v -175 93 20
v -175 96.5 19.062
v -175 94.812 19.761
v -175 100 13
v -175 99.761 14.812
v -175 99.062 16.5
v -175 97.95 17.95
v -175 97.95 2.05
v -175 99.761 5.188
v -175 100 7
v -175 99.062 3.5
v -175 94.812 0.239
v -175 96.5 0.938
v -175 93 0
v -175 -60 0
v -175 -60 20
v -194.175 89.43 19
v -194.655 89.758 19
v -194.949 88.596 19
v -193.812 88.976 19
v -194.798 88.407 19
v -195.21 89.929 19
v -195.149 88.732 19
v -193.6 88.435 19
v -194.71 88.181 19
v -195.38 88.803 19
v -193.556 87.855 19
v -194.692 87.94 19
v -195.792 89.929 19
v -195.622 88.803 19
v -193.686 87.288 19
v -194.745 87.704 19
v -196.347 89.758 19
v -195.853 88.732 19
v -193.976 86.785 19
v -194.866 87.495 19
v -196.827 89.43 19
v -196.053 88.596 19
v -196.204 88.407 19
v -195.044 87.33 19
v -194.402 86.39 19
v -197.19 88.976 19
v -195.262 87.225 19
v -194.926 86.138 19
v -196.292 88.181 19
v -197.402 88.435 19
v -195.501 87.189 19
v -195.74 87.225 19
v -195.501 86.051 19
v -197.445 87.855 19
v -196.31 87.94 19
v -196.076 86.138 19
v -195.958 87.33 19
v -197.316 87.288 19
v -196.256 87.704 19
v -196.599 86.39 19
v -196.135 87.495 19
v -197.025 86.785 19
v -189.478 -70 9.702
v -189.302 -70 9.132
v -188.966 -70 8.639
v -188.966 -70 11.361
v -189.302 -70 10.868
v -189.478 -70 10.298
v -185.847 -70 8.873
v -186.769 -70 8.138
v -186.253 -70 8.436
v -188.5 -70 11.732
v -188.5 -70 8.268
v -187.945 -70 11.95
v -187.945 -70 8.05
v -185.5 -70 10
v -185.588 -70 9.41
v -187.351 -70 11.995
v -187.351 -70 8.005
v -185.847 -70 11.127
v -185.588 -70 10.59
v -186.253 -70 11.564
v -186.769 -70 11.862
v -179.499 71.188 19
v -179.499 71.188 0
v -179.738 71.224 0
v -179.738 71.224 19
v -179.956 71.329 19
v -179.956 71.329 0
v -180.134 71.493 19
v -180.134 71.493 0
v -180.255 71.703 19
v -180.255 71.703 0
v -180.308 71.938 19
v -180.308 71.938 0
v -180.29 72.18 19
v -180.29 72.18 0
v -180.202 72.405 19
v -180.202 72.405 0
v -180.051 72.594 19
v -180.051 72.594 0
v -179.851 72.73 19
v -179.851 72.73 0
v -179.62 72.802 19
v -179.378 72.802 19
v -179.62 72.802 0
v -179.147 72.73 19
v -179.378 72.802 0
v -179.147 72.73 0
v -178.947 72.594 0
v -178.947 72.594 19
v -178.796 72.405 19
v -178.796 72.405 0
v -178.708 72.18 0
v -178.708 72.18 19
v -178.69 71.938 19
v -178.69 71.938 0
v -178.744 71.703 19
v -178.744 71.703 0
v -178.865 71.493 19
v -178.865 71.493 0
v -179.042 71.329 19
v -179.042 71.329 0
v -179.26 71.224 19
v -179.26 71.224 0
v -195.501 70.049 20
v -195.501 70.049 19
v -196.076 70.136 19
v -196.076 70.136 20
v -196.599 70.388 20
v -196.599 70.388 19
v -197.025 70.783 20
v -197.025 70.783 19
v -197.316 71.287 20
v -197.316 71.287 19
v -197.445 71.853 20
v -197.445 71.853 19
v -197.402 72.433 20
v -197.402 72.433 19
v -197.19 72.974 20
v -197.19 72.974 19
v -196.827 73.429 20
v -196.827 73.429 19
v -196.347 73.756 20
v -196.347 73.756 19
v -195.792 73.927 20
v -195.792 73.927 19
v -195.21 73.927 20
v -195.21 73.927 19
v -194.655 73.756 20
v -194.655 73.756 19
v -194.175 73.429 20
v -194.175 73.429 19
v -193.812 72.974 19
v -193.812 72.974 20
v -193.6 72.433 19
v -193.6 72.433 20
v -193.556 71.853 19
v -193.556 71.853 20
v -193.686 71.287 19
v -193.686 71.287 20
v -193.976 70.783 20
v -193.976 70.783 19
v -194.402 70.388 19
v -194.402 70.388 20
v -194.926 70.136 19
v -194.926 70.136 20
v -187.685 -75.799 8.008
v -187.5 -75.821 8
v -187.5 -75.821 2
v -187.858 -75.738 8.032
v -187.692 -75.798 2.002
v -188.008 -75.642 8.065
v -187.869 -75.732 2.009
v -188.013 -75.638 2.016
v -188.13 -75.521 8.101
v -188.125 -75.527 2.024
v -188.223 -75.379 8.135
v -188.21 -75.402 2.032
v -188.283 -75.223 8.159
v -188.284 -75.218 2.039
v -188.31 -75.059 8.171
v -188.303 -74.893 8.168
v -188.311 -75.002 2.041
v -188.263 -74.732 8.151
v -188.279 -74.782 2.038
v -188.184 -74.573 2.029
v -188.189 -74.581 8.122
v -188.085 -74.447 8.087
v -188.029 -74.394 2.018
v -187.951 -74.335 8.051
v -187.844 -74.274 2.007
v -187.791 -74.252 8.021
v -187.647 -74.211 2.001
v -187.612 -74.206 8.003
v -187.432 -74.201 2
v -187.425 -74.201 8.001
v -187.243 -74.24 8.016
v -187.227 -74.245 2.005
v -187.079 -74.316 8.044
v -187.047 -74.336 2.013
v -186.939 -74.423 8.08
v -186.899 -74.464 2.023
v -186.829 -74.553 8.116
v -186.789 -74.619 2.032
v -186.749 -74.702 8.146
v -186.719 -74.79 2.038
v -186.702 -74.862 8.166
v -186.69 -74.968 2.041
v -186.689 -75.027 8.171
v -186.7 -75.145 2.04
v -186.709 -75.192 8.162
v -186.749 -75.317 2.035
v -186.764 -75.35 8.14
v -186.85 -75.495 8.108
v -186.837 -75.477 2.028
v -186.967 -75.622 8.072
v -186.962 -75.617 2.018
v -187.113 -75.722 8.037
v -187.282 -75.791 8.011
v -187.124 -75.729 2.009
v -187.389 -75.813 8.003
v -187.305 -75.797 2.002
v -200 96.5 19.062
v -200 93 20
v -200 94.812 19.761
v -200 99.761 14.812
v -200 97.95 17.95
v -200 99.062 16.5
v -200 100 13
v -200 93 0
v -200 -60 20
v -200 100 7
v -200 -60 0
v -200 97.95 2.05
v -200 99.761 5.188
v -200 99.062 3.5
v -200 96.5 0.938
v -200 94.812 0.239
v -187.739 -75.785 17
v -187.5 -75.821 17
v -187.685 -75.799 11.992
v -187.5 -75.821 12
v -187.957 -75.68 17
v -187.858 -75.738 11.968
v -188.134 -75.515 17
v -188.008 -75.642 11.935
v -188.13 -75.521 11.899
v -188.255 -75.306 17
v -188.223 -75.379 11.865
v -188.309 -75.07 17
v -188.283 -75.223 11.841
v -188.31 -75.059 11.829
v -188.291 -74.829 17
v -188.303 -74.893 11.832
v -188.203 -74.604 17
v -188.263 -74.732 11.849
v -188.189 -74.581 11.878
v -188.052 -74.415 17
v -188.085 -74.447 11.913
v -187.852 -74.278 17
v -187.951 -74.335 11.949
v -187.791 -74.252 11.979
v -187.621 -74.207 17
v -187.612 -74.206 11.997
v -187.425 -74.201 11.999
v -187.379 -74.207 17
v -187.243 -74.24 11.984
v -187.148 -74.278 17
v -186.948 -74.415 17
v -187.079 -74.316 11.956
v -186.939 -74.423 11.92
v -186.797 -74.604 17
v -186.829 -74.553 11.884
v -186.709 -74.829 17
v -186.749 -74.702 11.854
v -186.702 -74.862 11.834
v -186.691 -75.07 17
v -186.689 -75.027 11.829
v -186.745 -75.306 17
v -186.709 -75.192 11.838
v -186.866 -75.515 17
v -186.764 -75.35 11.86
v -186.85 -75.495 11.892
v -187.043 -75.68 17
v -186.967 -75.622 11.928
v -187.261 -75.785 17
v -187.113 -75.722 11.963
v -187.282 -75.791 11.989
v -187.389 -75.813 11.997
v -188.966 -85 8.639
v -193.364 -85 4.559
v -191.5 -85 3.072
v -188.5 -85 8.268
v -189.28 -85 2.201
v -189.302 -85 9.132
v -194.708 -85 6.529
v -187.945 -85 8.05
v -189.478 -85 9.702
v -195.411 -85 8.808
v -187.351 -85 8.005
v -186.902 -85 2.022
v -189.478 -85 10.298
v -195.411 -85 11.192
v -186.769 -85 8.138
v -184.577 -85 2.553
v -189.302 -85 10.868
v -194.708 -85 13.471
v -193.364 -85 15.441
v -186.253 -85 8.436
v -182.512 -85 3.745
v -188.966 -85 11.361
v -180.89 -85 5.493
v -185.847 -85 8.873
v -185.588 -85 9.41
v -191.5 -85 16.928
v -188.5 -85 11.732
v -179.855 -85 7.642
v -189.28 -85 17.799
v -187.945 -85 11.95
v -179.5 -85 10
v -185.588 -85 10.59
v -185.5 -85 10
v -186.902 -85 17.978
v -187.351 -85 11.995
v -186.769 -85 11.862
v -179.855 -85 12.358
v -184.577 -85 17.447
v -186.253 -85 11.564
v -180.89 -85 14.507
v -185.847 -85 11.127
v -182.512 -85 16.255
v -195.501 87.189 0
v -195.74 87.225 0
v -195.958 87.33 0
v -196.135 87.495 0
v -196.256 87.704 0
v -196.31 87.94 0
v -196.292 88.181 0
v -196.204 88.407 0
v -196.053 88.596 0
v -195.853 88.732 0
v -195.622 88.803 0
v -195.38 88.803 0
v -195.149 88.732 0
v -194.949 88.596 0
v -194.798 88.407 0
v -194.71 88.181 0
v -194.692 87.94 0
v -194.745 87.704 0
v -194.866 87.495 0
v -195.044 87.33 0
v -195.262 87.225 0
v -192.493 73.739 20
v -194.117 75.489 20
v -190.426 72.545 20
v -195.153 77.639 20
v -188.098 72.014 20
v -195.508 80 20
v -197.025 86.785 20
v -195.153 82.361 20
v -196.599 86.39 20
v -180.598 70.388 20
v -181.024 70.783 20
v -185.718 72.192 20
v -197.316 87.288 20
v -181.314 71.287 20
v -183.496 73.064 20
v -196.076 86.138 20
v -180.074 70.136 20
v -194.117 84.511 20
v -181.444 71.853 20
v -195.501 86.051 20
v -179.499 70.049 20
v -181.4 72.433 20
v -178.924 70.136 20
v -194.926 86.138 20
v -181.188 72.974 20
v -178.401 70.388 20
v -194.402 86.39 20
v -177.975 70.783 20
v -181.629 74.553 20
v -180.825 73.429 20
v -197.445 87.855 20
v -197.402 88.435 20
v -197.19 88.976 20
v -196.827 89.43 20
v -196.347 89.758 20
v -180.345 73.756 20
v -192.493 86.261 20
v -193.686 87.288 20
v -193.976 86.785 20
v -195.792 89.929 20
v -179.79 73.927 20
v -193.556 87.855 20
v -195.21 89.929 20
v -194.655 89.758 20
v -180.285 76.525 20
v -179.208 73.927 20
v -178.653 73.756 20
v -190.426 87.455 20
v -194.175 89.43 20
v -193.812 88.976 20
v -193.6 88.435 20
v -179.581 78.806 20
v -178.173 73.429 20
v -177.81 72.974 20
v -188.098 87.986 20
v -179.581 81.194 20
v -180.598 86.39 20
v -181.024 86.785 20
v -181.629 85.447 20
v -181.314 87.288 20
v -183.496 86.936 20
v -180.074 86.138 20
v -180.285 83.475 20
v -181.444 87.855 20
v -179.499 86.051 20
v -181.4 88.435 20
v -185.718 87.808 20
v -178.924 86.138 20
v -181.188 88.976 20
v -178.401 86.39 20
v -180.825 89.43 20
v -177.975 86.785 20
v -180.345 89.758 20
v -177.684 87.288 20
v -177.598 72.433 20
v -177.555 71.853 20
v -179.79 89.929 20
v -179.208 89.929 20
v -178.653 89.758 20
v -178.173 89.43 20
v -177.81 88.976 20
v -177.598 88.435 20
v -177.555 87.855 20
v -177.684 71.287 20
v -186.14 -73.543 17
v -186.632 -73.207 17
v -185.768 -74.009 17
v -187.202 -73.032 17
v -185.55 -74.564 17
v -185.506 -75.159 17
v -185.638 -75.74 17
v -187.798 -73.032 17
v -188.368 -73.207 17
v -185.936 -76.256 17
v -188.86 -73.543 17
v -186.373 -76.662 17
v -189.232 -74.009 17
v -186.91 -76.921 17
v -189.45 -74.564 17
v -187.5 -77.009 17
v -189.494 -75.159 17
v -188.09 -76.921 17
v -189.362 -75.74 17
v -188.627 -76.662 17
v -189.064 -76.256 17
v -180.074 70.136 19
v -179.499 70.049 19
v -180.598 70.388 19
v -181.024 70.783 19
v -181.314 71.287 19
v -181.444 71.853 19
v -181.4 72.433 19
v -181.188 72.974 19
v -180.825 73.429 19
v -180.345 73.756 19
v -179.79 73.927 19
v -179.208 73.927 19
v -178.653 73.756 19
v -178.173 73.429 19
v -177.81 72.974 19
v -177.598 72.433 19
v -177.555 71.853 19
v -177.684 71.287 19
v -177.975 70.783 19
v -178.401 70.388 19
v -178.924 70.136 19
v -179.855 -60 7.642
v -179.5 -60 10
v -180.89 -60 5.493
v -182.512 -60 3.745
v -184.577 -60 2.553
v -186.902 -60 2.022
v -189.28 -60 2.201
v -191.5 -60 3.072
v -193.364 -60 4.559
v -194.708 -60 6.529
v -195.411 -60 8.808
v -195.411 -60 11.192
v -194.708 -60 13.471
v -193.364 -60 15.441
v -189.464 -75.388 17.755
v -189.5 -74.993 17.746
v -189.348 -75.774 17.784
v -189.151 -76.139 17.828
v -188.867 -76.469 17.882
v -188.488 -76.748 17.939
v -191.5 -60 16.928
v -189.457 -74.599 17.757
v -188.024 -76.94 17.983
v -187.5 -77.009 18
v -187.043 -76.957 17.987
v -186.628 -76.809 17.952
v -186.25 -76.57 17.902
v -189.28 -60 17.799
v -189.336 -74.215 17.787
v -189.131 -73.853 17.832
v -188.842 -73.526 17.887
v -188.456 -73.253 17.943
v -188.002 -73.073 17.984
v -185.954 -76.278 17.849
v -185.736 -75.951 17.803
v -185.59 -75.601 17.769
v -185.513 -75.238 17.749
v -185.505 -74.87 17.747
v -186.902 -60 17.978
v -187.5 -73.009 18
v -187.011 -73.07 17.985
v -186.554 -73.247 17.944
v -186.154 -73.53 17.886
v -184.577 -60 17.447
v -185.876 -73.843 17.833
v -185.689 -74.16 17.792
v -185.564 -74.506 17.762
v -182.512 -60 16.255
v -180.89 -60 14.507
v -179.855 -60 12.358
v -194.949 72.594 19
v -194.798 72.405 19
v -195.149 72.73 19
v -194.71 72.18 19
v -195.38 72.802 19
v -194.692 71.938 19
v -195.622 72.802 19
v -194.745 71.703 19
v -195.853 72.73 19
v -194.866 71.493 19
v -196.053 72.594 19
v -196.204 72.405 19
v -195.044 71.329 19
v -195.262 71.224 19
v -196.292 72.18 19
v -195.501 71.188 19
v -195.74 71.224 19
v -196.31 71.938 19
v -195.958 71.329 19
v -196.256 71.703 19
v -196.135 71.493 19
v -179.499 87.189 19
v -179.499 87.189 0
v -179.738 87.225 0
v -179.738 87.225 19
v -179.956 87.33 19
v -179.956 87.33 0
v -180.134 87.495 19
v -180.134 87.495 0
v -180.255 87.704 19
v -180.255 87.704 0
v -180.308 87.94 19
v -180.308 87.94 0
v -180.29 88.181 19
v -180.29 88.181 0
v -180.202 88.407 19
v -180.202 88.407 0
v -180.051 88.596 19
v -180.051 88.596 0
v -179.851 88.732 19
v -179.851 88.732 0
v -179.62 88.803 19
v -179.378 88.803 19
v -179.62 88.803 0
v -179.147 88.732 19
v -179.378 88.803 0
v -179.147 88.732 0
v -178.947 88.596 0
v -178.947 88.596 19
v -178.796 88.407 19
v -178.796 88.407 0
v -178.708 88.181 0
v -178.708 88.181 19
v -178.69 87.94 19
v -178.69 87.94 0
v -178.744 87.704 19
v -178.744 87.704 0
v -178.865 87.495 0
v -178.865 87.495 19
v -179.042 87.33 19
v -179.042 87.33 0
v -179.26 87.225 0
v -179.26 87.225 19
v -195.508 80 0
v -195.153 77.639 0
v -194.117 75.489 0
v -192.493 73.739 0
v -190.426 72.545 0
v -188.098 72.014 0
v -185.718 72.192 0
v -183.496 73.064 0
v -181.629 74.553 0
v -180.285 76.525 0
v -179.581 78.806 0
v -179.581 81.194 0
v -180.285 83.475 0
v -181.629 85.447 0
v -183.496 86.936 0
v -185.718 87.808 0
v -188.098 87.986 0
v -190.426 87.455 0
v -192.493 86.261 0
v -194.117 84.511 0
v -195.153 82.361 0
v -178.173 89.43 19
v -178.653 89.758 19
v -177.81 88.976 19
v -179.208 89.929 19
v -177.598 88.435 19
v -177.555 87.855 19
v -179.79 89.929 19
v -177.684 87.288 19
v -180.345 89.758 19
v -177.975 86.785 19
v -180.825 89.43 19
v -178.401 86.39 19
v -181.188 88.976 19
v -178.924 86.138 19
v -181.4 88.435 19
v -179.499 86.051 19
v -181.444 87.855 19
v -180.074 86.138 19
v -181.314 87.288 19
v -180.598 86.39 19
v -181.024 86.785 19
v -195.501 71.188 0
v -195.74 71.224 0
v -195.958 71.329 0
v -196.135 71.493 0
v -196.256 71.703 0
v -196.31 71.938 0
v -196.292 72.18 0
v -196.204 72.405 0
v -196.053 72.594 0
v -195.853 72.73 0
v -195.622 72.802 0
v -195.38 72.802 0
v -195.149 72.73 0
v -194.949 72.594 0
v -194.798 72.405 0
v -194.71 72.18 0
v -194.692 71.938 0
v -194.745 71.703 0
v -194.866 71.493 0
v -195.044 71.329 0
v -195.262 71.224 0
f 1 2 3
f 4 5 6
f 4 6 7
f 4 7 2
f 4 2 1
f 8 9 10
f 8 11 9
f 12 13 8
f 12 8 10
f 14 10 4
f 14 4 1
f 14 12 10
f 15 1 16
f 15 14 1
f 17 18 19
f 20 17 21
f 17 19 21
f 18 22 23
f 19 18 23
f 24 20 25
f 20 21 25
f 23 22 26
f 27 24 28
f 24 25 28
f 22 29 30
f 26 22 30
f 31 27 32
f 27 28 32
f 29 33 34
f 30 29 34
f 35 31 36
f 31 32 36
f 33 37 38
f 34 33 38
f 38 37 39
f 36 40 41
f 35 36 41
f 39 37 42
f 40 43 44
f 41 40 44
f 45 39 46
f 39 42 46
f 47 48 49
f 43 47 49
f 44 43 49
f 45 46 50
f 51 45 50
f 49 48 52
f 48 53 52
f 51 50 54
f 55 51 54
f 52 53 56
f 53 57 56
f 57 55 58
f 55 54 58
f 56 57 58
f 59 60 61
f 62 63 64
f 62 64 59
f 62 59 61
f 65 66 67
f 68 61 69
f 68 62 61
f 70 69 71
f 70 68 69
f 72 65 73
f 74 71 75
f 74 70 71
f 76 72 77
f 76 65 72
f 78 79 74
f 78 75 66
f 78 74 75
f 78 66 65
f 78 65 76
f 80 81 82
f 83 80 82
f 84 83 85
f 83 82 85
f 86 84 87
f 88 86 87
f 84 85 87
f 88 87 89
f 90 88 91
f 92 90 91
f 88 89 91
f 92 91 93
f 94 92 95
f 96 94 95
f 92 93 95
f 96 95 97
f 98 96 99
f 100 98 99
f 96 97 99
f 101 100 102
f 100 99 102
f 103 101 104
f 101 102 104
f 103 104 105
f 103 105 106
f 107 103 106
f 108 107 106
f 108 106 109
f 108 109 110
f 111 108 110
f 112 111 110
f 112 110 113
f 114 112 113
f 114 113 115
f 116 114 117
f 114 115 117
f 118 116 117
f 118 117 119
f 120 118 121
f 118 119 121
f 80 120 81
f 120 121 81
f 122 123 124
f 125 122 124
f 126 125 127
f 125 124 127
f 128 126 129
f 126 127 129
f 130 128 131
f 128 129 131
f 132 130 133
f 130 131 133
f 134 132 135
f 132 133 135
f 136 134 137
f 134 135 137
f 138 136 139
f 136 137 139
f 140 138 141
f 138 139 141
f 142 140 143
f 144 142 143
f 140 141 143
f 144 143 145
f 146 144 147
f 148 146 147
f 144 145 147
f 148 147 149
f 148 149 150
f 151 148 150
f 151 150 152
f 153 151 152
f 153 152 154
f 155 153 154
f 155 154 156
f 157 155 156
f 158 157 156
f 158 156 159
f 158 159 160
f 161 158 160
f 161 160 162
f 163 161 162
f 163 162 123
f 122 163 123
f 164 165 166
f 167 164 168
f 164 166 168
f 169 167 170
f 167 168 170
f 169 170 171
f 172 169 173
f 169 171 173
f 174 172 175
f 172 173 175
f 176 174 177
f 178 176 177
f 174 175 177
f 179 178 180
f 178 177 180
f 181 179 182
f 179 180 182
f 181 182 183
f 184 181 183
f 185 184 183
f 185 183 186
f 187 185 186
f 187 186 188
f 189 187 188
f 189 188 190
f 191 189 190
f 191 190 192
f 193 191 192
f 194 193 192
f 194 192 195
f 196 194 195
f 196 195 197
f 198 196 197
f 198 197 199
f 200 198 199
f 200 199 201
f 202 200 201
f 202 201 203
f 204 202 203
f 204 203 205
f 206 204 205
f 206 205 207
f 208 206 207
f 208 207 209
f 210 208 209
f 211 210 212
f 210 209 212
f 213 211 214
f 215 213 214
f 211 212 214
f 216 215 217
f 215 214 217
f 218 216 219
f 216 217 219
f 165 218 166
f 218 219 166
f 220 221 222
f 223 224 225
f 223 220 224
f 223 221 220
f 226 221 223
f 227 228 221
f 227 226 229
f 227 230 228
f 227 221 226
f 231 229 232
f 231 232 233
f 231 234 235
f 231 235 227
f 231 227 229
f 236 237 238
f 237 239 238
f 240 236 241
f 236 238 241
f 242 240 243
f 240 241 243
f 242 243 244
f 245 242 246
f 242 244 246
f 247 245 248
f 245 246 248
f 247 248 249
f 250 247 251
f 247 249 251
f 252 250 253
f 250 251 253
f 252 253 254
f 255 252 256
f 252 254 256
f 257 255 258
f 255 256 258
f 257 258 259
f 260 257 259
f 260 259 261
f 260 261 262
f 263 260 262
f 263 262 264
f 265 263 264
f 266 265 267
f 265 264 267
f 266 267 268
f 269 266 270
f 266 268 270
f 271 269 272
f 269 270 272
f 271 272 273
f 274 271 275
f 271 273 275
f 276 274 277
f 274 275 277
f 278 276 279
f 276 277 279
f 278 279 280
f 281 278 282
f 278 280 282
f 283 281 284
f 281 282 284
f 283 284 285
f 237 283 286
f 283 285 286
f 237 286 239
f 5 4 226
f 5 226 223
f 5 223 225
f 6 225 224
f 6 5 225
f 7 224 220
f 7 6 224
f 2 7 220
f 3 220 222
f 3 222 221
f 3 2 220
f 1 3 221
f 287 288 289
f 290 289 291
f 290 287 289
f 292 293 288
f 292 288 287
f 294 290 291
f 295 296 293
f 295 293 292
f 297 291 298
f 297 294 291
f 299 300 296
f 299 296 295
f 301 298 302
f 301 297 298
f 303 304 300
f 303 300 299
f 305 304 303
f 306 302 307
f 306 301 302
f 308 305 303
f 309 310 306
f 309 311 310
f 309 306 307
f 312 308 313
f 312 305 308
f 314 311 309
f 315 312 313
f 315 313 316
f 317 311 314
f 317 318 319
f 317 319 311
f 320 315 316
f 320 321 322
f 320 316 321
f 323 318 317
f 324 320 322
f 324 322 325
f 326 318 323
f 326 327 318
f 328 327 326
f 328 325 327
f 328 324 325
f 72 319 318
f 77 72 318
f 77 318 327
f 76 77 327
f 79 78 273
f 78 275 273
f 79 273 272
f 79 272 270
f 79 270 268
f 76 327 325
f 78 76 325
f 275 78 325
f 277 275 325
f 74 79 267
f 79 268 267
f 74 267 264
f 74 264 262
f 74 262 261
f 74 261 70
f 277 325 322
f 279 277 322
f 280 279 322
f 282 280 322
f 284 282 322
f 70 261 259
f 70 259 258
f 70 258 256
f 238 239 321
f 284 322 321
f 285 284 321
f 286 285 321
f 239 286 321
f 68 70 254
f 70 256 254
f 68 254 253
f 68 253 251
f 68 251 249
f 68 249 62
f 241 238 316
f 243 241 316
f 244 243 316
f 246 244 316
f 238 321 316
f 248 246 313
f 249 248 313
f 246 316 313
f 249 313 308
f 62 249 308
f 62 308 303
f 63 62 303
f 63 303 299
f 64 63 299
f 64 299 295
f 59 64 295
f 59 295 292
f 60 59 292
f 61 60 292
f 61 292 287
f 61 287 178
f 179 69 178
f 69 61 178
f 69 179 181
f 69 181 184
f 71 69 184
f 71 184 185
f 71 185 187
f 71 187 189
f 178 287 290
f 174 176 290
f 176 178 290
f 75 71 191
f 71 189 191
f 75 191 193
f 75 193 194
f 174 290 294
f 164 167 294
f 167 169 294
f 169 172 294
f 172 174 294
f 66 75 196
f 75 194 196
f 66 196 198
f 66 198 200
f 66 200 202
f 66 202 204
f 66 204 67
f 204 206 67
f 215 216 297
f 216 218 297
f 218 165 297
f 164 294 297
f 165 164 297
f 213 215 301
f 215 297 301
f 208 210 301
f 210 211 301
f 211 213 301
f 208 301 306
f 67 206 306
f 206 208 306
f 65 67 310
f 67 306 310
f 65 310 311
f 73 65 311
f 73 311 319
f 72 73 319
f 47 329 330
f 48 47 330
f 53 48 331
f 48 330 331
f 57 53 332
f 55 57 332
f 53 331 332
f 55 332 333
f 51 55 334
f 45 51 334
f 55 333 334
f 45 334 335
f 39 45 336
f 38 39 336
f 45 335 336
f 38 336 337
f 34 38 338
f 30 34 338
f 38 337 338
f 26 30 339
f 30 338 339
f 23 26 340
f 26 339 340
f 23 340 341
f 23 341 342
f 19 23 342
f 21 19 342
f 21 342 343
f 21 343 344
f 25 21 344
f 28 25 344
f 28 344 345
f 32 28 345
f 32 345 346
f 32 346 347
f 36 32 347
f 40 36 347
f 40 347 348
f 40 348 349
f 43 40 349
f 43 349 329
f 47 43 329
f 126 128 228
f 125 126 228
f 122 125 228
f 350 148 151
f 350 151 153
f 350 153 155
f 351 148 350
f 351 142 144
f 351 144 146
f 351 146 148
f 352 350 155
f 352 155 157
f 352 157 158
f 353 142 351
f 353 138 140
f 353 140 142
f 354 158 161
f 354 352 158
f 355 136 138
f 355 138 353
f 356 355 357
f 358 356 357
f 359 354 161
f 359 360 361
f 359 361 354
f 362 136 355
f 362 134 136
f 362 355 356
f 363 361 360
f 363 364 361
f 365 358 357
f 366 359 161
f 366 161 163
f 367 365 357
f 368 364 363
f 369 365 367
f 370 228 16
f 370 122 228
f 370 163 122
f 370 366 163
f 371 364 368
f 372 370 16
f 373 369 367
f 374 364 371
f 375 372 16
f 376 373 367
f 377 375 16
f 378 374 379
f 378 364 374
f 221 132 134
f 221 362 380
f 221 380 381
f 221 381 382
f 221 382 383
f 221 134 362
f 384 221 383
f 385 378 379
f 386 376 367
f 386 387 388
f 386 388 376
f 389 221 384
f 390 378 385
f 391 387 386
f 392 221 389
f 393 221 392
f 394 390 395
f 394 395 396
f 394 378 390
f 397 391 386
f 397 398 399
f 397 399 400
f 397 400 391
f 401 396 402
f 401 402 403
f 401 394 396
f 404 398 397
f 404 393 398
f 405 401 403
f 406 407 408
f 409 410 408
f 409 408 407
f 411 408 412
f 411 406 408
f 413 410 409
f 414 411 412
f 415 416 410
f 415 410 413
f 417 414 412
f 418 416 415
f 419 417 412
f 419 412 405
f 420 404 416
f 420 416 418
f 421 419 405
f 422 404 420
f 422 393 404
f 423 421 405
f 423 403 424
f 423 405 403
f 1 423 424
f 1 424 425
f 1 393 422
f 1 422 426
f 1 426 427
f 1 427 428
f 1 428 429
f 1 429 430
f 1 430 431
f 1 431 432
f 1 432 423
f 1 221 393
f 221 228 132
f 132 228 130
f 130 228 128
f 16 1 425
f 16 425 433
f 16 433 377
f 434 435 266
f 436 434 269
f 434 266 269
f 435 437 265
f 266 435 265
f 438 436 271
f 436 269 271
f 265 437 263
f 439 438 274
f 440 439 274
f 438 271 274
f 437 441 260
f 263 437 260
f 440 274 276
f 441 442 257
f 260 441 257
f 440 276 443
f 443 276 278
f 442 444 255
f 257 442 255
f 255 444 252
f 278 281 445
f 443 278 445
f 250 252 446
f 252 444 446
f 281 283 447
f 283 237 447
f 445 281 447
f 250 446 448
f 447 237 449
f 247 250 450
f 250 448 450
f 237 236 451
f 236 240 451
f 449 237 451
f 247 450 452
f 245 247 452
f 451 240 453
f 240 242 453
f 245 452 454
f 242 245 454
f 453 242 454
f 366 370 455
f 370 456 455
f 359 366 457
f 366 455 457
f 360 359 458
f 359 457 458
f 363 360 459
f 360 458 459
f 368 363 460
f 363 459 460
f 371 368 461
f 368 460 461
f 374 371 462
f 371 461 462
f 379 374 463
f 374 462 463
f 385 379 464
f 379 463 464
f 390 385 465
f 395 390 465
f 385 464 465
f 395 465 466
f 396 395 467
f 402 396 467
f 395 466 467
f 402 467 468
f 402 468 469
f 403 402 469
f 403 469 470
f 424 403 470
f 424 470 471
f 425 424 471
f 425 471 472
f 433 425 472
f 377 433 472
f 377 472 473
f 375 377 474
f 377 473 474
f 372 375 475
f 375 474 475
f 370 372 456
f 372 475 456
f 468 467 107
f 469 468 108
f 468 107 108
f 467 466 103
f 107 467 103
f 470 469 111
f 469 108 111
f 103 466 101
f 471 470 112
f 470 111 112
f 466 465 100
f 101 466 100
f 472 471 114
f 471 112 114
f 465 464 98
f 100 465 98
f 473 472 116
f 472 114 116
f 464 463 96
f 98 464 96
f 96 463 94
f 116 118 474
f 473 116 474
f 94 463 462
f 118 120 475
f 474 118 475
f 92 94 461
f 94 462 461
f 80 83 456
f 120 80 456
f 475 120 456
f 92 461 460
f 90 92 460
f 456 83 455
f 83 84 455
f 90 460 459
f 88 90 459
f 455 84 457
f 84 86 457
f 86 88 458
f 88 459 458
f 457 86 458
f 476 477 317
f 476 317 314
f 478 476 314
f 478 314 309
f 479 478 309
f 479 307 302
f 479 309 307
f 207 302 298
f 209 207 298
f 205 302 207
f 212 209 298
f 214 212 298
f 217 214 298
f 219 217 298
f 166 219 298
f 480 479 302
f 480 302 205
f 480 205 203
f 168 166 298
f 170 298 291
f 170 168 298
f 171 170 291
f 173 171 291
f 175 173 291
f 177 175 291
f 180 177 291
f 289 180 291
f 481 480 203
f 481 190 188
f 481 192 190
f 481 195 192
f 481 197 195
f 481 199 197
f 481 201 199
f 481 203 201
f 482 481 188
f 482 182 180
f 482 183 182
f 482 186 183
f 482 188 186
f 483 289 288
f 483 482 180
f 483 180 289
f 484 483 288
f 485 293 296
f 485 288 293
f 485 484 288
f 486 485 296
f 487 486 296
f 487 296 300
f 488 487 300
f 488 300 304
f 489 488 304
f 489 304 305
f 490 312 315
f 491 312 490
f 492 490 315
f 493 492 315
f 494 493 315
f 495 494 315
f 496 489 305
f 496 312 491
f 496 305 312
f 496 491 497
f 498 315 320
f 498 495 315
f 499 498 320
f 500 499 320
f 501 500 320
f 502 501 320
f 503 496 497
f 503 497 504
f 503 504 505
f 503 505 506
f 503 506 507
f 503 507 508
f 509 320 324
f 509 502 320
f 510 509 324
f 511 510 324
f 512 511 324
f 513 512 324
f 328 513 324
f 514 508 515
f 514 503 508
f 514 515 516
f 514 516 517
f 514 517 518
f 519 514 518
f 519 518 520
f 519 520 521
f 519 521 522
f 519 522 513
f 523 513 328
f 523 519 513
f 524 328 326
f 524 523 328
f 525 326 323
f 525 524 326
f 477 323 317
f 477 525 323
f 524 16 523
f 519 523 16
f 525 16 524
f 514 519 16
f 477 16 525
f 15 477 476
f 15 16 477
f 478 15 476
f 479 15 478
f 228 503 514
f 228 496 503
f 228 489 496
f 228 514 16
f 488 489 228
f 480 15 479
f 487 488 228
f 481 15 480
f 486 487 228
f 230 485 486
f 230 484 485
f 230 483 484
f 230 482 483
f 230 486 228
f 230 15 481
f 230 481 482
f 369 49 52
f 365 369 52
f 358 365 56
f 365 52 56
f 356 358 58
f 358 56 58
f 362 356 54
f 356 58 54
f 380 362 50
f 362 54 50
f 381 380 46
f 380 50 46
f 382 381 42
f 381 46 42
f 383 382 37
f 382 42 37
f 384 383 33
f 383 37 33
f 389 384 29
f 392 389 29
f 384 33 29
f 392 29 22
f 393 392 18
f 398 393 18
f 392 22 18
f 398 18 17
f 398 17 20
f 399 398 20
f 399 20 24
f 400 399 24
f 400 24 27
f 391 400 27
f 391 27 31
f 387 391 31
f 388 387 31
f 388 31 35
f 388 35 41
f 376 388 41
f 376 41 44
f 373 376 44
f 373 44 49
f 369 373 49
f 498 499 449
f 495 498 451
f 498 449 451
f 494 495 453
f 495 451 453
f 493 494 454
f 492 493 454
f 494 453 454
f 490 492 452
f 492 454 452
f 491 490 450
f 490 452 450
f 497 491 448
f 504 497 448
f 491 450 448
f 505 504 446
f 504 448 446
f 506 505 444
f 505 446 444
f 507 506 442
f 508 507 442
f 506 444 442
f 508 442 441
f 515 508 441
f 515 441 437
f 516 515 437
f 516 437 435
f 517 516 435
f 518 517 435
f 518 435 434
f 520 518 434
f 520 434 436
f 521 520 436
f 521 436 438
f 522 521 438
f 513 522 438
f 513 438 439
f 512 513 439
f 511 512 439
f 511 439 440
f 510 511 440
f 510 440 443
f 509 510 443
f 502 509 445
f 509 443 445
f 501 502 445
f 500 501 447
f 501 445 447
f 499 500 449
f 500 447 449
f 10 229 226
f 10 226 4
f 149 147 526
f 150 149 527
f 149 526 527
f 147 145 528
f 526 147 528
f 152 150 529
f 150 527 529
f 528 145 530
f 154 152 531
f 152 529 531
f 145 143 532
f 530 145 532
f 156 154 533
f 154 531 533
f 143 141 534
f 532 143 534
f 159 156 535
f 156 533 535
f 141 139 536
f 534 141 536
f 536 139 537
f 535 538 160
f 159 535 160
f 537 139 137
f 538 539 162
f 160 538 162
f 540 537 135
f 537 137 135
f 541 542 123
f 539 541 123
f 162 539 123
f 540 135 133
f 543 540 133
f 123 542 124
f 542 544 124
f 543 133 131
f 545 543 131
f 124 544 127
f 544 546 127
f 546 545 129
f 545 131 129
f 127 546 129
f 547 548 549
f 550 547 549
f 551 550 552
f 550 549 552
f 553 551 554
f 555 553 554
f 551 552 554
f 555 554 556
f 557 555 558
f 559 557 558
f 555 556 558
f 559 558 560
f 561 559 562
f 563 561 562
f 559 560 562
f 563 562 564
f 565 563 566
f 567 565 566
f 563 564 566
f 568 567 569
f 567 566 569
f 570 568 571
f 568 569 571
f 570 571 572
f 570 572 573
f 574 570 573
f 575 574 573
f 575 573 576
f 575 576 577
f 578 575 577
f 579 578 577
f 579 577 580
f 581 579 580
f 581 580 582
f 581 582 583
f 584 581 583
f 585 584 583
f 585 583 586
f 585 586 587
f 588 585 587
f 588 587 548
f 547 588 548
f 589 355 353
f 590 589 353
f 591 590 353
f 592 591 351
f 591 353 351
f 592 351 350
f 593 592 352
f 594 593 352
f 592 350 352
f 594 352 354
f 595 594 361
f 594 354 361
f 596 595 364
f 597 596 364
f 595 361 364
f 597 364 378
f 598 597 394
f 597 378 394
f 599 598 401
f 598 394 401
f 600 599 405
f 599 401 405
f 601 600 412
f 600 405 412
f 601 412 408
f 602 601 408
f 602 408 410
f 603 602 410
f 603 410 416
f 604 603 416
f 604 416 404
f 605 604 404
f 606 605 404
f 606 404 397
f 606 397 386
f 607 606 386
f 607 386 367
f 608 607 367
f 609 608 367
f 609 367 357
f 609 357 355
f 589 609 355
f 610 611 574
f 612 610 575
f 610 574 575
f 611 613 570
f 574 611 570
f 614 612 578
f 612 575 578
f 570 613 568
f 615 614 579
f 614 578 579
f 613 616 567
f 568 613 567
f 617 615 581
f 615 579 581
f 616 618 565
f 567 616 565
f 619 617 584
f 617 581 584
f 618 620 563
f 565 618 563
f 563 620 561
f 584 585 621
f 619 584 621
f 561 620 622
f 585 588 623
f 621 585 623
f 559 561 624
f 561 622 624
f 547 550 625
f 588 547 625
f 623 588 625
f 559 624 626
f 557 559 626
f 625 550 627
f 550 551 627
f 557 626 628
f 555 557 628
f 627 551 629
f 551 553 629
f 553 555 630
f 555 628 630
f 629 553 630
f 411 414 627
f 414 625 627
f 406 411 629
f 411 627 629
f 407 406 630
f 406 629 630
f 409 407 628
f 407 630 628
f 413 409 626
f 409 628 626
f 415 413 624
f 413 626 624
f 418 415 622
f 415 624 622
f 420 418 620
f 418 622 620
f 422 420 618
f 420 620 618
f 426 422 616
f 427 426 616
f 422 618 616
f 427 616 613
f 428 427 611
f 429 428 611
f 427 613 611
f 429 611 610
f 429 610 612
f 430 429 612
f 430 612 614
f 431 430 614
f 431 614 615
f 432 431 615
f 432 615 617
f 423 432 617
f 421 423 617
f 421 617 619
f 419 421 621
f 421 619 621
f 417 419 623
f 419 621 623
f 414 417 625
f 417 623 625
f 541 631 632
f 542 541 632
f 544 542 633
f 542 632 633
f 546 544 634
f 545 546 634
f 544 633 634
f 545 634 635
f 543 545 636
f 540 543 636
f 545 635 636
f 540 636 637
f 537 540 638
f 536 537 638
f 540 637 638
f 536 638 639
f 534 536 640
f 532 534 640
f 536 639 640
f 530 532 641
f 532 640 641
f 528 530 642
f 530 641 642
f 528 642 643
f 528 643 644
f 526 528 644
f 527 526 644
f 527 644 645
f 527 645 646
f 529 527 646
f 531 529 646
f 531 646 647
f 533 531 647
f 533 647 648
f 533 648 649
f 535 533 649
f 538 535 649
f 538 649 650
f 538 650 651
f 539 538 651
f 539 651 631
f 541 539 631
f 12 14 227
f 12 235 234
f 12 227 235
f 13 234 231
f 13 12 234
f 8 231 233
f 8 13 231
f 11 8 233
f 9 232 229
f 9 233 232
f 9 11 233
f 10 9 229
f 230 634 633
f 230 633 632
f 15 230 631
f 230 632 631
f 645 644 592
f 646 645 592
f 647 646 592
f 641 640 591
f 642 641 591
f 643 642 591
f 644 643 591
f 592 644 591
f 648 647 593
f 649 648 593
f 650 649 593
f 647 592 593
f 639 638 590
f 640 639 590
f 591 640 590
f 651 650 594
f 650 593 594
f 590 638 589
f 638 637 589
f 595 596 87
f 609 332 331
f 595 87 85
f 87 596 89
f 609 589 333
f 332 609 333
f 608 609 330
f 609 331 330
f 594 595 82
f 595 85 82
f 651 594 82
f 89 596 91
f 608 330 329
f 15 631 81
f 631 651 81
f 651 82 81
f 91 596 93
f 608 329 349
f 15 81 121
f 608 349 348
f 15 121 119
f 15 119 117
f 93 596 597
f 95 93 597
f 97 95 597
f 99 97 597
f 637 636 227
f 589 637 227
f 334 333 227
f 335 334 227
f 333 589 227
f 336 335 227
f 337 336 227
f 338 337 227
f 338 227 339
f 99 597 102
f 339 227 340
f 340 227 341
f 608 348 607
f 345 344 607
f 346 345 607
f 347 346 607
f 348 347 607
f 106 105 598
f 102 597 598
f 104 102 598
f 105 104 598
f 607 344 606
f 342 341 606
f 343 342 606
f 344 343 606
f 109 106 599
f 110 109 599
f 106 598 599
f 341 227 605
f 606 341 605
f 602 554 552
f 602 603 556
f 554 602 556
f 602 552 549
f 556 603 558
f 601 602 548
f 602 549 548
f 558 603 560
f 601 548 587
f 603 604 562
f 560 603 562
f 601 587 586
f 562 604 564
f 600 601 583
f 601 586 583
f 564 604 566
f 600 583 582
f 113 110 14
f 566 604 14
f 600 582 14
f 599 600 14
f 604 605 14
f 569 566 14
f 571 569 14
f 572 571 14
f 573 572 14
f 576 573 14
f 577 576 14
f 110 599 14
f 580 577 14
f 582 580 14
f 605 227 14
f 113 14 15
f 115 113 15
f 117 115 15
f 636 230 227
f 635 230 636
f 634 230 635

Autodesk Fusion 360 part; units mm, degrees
sketch "Sketch4" plane through (0, 0, 0) normal (0, 0, 1) x (1, 0, 0)
  line L0 (-200, 100) -> (-175, 100)
  line L1 (-175, 100) -> (-175, -60)
  line L2 (-175, -60) -> (-200, -60)
  line L3 (-200, -60) -> (-200, 100)
  dimension "d3" = 25
  dimension "d4" = 160
extrude "Extrude1" add sketch "Sketch4" along normal blind 20
sketch "Sketch5" plane through (0, 0, 20) normal (0, 0, 1) x (-1, 0, 0)
  line L0 (200, 60) -> (175, 60)
  line L1 (175, 60) -> (175, -100)
  line L2 (175, -100) -> (200, -100)
  line L3 (200, -100) -> (200, 60)
  circle A0 centre (187.5, -80) radius 8.0085
  dimension "d8" = 16.017
extrude "Extrude2" cut sketch "Sketch5" against normal blind 55 contours A0
fillet "Fillet1" radius 7 2 edges at (-187.5, 100, 20) (-187.5, 100, 0)
sketch "Sketch11" plane through (0, 0, 20) normal (0, 0, 1) x (-1, 0, 0)
  line L0 (200, -93) -> (200, 60)
  line L1 (200, 60) -> (175, 60)
  line L2 (175, 60) -> (175, -93)
  circle A0 centre (187.5, -80) radius 8.0085
  line L3 (187.5, -80) -> (179.4991, -88.0009)
  line L4 (187.5, -80) -> (195.5009, -88.0009)
  line L5 (187.5, -80) -> (195.5009, -71.9991)
  line L6 (187.5, -80) -> (179.4991, -71.9991)
  line L7 (175, -93) -> (200, -93)
hole "Hole2" at (-179.4991, 71.9991, 20) at (-179.4991, 88.0009, 20) at (-195.5009, 88.0009, 20) at (-195.5009, 71.9991, 20) direction (0, 0, -1) diameter 1.623 depth 20 tip angle 180 counterbore diameter 3.9 counterbore depth 1
sketch "Sketch13" plane through (0, -60, 0) normal (0, -1, 0) x (1, 0, 0)
  line L0 (-200, 0) -> (-175, 0)
  line L1 (-175, 0) -> (-175, 20)
  line L2 (-175, 20) -> (-200, 20)
  line L3 (-200, 20) -> (-200, 0)
  circle A0 centre (-187.5, 10) radius 8
  dimension "d46" = 16
extrude "Extrude8" add sketch "Sketch13" along normal blind 25 contours A0
sketch "Sketch14" plane through (0, -85, 0) normal (0, -1, 0) x (1, 0, 0)
  circle A0 centre (-187.5, 10) radius 8
  circle A1 centre (-187.5, 10) radius 2.0005
  dimension "d49" = 4.001
extrude "Extrude9" cut sketch "Sketch14" against normal blind 15 contours A1
sketch "Sketch16" plane through (0, -85, 0) normal (0, -1, 0) x (1, 0, 0)
  circle A0 centre (-187.5, 10) radius 2.0005
  circle A1 centre (-187.5, 10) radius 8
  curve A2
hole "Hole4" at (-187.5, -75.0094, 18) direction (0, 0, -1) diameter 1.623 end through all counterbore diameter 4 counterbore depth 1
component "4124A15_7-1 4 Diameter Smooth-Cut Circular Saw Blade for Wood" placed x (1, 0, 0) y (0, 1, 0) z (0, 0, 1) at (0, 0, 0)
component "6343K96_Bearing Locknut" placed x (1, 0, 0) y (0, 0, -1) z (0, 1, 0) at (-164.7507, -187.0518, -22.2618)
component "6627T34_Stepper Motor" placed x (1, 0, 0) y (0, 1, 0) z (0, 0, 1) at (-161.9415, -183.813, -21.8716)
